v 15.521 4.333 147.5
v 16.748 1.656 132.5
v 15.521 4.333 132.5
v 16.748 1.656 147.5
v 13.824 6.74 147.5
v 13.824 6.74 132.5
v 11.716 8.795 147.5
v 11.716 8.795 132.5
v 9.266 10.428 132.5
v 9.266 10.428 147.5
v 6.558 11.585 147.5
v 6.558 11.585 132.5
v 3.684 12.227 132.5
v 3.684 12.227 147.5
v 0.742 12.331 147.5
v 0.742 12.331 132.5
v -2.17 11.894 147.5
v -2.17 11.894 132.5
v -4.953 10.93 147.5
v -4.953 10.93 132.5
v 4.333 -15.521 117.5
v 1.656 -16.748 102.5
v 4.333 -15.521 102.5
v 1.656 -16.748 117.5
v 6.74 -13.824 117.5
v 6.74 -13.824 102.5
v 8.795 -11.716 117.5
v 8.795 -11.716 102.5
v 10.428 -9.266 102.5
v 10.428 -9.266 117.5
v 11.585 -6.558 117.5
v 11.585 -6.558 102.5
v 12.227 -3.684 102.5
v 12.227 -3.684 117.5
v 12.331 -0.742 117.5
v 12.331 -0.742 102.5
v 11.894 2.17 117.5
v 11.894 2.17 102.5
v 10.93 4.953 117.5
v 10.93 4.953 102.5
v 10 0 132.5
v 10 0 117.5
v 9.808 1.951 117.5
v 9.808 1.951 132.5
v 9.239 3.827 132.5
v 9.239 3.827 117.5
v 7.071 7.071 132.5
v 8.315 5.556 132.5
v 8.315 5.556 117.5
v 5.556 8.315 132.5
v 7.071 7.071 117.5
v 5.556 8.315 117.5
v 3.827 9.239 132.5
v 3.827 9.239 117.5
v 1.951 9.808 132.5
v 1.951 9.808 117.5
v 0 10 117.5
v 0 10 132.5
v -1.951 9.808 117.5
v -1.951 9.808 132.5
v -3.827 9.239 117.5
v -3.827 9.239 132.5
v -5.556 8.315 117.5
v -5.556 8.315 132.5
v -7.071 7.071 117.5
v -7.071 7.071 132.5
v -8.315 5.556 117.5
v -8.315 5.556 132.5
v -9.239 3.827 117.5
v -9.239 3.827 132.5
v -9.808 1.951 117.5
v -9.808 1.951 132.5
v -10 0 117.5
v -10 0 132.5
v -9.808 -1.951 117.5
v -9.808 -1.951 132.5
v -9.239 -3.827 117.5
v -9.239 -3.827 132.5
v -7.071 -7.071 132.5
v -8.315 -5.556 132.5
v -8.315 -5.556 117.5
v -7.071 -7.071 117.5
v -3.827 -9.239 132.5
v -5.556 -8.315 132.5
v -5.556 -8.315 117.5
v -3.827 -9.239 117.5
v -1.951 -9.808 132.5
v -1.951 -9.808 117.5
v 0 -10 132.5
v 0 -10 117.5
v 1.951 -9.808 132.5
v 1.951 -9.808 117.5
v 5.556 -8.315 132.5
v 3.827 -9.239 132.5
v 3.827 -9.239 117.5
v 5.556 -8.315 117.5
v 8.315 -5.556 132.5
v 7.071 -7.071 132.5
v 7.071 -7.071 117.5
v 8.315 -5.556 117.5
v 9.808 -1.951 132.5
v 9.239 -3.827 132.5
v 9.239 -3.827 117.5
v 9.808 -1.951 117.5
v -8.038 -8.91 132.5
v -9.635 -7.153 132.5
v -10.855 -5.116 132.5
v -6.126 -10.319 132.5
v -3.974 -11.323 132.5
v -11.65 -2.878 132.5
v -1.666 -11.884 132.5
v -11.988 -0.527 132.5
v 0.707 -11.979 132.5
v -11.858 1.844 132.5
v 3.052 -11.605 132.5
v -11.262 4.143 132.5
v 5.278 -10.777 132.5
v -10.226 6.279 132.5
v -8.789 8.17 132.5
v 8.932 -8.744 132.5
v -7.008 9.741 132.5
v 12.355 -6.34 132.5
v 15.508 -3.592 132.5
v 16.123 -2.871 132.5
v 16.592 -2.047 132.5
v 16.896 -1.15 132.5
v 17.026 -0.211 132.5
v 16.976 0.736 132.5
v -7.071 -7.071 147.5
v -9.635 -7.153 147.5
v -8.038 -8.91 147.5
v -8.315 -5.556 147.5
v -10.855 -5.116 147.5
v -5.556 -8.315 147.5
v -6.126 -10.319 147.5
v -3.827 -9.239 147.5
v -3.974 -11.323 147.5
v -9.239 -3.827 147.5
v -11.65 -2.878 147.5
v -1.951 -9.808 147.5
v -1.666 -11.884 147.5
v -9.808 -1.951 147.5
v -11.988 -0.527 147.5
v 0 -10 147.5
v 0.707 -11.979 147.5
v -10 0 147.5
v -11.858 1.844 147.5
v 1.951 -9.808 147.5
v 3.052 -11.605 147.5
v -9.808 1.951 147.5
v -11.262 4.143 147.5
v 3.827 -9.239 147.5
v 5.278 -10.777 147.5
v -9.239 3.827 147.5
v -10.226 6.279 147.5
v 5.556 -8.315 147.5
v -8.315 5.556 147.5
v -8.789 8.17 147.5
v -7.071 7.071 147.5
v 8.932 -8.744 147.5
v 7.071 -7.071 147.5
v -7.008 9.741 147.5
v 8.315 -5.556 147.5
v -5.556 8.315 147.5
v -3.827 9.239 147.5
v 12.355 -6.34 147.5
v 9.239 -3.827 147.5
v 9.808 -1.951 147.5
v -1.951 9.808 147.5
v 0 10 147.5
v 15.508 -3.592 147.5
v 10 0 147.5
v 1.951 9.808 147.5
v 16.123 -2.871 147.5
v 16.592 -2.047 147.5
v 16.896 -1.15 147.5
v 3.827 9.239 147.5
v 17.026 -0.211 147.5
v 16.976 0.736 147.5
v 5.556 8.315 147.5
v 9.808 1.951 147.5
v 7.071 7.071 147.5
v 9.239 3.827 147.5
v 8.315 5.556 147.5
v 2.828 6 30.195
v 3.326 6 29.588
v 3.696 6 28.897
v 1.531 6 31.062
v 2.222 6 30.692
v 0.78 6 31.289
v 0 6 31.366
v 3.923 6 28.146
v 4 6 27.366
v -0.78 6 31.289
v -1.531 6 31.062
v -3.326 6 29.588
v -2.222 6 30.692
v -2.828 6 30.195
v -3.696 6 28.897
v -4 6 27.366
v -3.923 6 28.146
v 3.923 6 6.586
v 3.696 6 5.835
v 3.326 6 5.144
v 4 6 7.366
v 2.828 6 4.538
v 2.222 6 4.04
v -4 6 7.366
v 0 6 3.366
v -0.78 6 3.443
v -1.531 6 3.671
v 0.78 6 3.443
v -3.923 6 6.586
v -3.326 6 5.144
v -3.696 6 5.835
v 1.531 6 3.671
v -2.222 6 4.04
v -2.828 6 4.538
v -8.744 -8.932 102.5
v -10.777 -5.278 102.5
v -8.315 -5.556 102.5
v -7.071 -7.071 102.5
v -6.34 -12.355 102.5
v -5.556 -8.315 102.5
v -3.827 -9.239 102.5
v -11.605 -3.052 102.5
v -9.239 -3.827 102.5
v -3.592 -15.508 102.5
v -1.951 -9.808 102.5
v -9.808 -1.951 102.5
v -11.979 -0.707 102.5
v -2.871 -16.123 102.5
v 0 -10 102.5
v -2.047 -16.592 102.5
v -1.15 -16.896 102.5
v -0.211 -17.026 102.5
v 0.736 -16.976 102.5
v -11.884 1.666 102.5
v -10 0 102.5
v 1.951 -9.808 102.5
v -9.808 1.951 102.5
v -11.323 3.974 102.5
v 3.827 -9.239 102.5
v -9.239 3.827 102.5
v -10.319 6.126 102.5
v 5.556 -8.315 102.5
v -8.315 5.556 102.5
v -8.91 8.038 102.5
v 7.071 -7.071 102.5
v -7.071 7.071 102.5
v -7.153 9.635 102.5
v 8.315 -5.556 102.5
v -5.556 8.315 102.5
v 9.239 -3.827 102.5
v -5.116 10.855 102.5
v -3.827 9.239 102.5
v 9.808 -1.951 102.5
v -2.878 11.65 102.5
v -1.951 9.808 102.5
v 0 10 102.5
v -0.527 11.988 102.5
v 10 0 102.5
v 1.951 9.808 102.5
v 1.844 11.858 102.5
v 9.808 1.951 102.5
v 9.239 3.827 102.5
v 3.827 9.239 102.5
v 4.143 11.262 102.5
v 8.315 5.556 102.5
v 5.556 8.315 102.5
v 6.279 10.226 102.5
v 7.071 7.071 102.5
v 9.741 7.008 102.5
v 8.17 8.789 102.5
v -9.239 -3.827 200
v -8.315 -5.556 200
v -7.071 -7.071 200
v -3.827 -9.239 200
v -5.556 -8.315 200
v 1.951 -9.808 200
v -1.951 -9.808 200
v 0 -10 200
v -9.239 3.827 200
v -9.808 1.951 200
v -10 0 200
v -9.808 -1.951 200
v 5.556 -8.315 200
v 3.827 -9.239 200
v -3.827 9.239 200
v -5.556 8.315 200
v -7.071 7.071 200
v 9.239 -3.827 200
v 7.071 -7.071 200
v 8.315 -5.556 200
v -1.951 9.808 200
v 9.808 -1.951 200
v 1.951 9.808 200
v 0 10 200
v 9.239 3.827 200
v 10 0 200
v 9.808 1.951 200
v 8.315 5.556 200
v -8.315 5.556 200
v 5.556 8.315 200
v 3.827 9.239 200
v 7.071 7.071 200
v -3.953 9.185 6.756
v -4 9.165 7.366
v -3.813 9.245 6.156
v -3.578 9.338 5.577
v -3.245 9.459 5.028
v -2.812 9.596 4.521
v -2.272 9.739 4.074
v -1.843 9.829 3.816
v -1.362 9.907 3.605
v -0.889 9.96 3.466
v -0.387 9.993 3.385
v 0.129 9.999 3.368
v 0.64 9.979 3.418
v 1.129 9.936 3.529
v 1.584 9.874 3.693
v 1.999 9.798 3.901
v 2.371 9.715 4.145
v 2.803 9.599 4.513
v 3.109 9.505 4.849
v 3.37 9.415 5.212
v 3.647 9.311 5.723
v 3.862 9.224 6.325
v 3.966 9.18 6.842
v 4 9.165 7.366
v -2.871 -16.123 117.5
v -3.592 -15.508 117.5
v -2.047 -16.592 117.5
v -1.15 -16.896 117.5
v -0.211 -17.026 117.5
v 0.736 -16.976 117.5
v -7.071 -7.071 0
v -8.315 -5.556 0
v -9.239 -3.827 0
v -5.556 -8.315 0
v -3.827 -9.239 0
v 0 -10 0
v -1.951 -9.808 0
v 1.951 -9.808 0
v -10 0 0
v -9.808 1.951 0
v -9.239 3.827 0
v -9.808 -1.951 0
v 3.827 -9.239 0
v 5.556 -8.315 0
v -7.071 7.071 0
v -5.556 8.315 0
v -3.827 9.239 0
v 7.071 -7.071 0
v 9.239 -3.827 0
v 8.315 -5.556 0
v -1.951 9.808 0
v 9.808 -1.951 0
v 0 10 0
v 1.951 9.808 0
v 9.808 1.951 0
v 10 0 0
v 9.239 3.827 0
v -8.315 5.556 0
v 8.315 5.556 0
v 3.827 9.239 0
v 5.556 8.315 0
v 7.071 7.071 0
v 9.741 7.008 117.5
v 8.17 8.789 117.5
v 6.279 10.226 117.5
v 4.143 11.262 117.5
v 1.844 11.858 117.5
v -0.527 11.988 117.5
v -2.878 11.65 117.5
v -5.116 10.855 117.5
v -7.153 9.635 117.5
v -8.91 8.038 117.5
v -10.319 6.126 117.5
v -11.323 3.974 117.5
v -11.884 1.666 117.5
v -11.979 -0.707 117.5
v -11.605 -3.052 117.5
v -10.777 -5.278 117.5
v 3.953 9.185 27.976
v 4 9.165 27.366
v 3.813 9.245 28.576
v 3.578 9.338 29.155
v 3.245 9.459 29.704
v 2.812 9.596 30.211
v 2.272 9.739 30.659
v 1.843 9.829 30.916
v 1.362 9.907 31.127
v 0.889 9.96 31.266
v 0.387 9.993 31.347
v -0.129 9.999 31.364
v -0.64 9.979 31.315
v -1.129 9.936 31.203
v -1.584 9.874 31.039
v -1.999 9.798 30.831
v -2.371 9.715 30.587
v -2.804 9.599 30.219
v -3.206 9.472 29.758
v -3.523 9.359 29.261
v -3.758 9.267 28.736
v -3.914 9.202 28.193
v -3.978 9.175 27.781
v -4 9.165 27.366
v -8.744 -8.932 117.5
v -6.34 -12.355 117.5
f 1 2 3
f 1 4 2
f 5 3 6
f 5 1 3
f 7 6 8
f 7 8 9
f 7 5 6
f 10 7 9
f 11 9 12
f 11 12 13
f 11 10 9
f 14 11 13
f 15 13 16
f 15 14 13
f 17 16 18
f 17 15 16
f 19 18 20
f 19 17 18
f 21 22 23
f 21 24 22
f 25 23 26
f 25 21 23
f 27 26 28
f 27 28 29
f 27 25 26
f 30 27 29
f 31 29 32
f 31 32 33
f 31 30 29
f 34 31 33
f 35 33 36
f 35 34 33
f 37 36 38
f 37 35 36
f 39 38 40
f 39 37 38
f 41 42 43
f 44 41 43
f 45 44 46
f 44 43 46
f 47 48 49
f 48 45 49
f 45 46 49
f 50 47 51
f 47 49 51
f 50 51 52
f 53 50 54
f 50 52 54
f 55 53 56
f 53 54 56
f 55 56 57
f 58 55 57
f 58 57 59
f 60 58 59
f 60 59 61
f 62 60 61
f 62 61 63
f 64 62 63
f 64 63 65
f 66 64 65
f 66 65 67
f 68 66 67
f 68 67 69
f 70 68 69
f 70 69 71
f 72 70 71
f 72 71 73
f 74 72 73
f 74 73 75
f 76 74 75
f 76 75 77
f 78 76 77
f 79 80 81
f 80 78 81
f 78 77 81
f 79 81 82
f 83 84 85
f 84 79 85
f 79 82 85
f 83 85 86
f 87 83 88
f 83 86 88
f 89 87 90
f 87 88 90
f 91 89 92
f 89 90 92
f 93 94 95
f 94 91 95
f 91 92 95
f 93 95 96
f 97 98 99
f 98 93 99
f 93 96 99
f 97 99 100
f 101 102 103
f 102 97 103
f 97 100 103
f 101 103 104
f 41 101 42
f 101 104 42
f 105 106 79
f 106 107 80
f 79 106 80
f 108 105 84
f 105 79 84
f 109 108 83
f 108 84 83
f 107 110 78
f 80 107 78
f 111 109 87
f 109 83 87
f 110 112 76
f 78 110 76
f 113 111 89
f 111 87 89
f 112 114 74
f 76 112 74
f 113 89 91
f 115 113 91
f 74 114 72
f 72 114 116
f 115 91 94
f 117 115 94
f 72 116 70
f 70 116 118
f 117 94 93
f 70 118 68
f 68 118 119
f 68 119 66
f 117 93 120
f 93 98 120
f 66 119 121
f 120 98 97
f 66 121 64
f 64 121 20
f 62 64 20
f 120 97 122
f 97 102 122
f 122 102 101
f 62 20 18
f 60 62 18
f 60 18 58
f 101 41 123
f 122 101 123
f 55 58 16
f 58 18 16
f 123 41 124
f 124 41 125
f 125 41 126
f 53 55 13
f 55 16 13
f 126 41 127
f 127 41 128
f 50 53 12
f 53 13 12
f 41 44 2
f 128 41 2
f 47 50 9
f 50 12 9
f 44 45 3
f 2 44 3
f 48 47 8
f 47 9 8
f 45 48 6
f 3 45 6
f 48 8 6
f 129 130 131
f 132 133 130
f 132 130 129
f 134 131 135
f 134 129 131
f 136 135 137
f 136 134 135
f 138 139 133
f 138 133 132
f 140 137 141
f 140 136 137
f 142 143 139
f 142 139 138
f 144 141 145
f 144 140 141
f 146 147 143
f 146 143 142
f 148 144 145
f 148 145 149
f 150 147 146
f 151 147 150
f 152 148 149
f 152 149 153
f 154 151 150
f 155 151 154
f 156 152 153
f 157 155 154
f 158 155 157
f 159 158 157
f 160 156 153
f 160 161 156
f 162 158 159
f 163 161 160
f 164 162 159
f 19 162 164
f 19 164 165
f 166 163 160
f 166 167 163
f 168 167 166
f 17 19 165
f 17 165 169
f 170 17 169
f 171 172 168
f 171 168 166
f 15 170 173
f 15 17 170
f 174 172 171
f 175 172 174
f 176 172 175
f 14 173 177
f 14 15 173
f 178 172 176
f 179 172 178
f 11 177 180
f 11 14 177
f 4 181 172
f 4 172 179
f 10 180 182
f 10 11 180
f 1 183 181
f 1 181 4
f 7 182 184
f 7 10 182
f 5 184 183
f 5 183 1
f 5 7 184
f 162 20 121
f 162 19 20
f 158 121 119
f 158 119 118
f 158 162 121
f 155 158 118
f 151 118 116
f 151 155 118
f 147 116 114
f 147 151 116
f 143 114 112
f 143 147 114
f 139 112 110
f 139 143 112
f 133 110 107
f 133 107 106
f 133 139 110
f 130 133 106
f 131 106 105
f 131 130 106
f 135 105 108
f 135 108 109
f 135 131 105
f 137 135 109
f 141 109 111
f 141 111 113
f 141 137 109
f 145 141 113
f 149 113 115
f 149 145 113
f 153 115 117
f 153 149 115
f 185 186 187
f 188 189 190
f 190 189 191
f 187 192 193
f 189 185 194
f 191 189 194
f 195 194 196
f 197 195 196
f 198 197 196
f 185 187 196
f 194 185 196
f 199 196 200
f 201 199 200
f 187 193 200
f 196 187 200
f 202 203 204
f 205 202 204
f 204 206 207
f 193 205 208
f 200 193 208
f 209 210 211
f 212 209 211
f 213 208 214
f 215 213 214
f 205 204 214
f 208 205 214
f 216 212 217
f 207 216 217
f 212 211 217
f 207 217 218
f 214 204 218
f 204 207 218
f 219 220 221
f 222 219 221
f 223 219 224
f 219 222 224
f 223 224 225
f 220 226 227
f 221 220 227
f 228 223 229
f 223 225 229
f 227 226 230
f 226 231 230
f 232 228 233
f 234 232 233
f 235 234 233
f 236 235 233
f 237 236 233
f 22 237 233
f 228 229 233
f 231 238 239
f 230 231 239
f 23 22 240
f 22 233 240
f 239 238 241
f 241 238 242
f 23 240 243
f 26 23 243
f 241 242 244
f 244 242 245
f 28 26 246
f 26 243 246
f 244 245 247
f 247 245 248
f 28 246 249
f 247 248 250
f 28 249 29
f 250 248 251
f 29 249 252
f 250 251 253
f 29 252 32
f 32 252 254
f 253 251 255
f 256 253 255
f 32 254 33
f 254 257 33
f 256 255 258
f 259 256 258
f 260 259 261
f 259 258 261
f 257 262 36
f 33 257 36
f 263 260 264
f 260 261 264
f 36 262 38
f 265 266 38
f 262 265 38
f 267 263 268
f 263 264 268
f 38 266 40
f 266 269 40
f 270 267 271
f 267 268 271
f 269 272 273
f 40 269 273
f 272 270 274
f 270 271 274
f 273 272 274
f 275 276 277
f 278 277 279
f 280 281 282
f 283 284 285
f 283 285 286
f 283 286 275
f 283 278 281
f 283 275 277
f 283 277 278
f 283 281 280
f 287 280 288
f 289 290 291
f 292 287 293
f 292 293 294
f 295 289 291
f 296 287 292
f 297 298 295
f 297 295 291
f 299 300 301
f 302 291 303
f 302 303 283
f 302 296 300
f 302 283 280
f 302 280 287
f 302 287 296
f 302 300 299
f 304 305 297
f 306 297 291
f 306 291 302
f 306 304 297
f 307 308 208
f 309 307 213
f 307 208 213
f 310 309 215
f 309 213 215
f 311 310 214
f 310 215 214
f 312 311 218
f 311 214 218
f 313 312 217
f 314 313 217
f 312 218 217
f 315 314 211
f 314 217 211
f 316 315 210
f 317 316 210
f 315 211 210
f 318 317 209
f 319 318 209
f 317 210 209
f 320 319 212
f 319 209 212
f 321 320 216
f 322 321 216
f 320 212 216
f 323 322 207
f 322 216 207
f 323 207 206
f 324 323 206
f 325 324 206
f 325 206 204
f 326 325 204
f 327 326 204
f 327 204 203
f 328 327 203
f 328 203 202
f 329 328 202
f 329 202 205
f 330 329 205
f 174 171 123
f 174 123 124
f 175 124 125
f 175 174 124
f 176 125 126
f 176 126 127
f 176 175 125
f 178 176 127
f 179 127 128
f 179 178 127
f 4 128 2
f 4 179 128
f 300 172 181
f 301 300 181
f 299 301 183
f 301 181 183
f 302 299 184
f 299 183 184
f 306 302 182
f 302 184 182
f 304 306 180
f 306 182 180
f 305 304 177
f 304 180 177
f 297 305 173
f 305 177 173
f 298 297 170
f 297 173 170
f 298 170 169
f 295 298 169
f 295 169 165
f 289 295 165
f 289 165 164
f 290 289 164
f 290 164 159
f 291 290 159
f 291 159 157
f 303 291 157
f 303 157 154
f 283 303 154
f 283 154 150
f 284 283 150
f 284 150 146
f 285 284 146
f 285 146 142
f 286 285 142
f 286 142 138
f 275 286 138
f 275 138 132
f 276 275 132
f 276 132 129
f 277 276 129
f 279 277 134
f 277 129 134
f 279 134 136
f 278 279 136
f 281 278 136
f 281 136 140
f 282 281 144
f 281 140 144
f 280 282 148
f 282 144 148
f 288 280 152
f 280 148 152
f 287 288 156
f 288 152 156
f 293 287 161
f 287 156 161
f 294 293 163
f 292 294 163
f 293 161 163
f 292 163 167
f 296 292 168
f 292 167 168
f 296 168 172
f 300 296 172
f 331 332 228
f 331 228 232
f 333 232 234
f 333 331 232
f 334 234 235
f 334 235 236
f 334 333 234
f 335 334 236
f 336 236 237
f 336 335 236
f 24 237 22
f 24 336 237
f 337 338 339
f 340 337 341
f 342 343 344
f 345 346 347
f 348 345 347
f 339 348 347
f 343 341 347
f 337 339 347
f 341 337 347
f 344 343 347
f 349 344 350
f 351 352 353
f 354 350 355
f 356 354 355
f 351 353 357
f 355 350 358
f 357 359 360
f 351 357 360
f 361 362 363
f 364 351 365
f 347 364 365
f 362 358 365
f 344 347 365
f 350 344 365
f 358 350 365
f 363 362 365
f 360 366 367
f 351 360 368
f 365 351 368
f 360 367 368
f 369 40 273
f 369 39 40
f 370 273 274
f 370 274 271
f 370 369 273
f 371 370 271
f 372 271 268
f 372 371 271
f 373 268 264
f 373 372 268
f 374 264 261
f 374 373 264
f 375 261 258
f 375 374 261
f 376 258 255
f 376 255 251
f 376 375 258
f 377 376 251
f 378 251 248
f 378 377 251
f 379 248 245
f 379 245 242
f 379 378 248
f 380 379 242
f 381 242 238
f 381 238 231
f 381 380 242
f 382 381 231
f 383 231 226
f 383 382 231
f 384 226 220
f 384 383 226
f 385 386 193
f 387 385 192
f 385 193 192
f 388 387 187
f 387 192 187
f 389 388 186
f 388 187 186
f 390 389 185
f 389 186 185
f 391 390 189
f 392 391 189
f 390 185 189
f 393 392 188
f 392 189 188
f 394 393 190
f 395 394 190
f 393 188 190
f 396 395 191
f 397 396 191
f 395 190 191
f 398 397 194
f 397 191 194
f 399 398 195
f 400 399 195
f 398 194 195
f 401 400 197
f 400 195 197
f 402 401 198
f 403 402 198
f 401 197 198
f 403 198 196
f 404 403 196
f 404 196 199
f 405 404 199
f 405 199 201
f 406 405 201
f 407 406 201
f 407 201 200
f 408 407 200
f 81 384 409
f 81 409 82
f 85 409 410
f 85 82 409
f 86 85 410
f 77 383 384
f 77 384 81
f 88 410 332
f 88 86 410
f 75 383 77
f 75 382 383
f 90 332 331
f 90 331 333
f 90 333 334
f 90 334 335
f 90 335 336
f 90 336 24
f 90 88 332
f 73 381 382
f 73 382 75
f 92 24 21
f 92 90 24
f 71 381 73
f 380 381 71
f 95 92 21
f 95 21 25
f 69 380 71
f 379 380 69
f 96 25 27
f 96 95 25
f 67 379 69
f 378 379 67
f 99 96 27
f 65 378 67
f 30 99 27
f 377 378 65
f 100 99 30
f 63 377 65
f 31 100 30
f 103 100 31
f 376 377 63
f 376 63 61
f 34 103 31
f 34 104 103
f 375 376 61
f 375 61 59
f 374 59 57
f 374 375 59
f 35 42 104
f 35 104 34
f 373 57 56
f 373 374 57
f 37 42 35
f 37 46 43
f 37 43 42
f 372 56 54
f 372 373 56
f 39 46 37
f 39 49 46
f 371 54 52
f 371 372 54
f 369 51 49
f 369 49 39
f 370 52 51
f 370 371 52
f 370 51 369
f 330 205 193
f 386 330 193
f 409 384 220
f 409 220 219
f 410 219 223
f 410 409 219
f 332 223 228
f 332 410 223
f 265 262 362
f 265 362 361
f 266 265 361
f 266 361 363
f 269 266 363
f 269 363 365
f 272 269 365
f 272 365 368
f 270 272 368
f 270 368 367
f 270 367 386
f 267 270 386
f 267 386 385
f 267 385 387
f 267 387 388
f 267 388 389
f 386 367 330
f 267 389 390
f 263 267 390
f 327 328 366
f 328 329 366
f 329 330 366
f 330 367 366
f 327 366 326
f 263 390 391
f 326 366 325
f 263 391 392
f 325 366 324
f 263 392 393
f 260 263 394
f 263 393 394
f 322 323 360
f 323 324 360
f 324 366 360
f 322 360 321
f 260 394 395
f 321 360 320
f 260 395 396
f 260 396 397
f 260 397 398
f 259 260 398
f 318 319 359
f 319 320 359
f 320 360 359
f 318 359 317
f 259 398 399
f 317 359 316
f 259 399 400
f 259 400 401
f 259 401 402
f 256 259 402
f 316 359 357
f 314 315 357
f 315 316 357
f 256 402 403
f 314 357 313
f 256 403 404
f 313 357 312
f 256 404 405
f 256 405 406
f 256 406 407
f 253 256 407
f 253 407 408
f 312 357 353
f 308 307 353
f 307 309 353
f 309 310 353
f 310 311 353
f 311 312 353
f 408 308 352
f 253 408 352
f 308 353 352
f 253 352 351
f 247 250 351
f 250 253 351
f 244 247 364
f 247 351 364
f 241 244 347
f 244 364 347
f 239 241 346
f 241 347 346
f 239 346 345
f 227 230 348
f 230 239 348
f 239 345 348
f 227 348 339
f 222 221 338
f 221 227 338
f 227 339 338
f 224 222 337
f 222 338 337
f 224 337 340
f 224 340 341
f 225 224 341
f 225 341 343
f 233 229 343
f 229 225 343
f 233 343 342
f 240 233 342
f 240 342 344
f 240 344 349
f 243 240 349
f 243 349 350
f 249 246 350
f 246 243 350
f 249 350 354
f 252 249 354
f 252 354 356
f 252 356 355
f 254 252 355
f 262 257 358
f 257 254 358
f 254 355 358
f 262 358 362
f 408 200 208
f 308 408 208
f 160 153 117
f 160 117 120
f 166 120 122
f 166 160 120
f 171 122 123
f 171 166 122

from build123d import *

# Parameters (mm, degrees)
SKETCH1_R           = 10
BOSS_EXTRUDE1_DEPTH = 200
CUT_EXTRUDE1_DEPTH  = 201.888028513
BOSS_EXTRUDE2_DEPTH = 7.5
BOSS_EXTRUDE3_DEPTH = 7.5


with BuildPart() as part:
    # Sketch1 → Boss-Extrude1 (new body)
    with BuildSketch(Plane.XY):
        Circle(SKETCH1_R)
    extrude(amount=BOSS_EXTRUDE1_DEPTH)

    # Sketch2 → Cut-Extrude1 (cut, through all)
    with BuildSketch(Plane(origin=(0, 6, 0), x_dir=(1, 0, 0), z_dir=(0, 1, 0))):
        with BuildLine():
            Line((4, -7.366085137), (4, -27.366085137))
            ThreePointArc((4, -27.366085137), (0, -31.366085137), (-4, -27.366085137))
            Line((-4, -27.366085137), (-4, -7.366085137))
            ThreePointArc((-4, -7.366085137), (0, -3.366085137), (4, -7.366085137))
        make_face()
    extrude(amount=CUT_EXTRUDE1_DEPTH, mode=Mode.SUBTRACT)

    # Sketch3 → Boss-Extrude2 (add, symmetric)
    with BuildSketch(Plane.XY.offset(140)):
        with BuildLine():
            ThreePointArc((-4.952730673, 10.930254292), (-10.854939686, -5.115690024), (5.277504453, -10.777195681))
            ThreePointArc((5.277504453, -10.777195681), (10.675038927, -7.586922797), (15.50773958, -3.59239856))
            ThreePointArc((15.50773958, -3.59239856), (16.896032107, -1.149665837), (16.74776808, 1.656099135))
            ThreePointArc((16.74776808, 1.656099135), (7.938689804, 11.069291645), (-4.952730673, 10.930254292))
        make_face()
    extrude(amount=BOSS_EXTRUDE2_DEPTH, both=True)

    # Sketch4 → Boss-Extrude3 (add, symmetric)
    with BuildSketch(Plane.XY.offset(110)):
        with BuildLine():
            ThreePointArc((10.930254292, 4.952730673), (-5.115690024, 10.854939686), (-10.777195681, -5.277504453))
            ThreePointArc((-10.777195681, -5.277504453), (-7.586922797, -10.675038927), (-3.59239856, -15.50773958))
            ThreePointArc((-3.59239856, -15.50773958), (-1.149665837, -16.896032107), (1.656099135, -16.74776808))
            ThreePointArc((1.656099135, -16.74776808), (11.069291645, -7.938689804), (10.930254292, 4.952730673))
        make_face()
    extrude(amount=BOSS_EXTRUDE3_DEPTH, both=True)


solid = part.part
